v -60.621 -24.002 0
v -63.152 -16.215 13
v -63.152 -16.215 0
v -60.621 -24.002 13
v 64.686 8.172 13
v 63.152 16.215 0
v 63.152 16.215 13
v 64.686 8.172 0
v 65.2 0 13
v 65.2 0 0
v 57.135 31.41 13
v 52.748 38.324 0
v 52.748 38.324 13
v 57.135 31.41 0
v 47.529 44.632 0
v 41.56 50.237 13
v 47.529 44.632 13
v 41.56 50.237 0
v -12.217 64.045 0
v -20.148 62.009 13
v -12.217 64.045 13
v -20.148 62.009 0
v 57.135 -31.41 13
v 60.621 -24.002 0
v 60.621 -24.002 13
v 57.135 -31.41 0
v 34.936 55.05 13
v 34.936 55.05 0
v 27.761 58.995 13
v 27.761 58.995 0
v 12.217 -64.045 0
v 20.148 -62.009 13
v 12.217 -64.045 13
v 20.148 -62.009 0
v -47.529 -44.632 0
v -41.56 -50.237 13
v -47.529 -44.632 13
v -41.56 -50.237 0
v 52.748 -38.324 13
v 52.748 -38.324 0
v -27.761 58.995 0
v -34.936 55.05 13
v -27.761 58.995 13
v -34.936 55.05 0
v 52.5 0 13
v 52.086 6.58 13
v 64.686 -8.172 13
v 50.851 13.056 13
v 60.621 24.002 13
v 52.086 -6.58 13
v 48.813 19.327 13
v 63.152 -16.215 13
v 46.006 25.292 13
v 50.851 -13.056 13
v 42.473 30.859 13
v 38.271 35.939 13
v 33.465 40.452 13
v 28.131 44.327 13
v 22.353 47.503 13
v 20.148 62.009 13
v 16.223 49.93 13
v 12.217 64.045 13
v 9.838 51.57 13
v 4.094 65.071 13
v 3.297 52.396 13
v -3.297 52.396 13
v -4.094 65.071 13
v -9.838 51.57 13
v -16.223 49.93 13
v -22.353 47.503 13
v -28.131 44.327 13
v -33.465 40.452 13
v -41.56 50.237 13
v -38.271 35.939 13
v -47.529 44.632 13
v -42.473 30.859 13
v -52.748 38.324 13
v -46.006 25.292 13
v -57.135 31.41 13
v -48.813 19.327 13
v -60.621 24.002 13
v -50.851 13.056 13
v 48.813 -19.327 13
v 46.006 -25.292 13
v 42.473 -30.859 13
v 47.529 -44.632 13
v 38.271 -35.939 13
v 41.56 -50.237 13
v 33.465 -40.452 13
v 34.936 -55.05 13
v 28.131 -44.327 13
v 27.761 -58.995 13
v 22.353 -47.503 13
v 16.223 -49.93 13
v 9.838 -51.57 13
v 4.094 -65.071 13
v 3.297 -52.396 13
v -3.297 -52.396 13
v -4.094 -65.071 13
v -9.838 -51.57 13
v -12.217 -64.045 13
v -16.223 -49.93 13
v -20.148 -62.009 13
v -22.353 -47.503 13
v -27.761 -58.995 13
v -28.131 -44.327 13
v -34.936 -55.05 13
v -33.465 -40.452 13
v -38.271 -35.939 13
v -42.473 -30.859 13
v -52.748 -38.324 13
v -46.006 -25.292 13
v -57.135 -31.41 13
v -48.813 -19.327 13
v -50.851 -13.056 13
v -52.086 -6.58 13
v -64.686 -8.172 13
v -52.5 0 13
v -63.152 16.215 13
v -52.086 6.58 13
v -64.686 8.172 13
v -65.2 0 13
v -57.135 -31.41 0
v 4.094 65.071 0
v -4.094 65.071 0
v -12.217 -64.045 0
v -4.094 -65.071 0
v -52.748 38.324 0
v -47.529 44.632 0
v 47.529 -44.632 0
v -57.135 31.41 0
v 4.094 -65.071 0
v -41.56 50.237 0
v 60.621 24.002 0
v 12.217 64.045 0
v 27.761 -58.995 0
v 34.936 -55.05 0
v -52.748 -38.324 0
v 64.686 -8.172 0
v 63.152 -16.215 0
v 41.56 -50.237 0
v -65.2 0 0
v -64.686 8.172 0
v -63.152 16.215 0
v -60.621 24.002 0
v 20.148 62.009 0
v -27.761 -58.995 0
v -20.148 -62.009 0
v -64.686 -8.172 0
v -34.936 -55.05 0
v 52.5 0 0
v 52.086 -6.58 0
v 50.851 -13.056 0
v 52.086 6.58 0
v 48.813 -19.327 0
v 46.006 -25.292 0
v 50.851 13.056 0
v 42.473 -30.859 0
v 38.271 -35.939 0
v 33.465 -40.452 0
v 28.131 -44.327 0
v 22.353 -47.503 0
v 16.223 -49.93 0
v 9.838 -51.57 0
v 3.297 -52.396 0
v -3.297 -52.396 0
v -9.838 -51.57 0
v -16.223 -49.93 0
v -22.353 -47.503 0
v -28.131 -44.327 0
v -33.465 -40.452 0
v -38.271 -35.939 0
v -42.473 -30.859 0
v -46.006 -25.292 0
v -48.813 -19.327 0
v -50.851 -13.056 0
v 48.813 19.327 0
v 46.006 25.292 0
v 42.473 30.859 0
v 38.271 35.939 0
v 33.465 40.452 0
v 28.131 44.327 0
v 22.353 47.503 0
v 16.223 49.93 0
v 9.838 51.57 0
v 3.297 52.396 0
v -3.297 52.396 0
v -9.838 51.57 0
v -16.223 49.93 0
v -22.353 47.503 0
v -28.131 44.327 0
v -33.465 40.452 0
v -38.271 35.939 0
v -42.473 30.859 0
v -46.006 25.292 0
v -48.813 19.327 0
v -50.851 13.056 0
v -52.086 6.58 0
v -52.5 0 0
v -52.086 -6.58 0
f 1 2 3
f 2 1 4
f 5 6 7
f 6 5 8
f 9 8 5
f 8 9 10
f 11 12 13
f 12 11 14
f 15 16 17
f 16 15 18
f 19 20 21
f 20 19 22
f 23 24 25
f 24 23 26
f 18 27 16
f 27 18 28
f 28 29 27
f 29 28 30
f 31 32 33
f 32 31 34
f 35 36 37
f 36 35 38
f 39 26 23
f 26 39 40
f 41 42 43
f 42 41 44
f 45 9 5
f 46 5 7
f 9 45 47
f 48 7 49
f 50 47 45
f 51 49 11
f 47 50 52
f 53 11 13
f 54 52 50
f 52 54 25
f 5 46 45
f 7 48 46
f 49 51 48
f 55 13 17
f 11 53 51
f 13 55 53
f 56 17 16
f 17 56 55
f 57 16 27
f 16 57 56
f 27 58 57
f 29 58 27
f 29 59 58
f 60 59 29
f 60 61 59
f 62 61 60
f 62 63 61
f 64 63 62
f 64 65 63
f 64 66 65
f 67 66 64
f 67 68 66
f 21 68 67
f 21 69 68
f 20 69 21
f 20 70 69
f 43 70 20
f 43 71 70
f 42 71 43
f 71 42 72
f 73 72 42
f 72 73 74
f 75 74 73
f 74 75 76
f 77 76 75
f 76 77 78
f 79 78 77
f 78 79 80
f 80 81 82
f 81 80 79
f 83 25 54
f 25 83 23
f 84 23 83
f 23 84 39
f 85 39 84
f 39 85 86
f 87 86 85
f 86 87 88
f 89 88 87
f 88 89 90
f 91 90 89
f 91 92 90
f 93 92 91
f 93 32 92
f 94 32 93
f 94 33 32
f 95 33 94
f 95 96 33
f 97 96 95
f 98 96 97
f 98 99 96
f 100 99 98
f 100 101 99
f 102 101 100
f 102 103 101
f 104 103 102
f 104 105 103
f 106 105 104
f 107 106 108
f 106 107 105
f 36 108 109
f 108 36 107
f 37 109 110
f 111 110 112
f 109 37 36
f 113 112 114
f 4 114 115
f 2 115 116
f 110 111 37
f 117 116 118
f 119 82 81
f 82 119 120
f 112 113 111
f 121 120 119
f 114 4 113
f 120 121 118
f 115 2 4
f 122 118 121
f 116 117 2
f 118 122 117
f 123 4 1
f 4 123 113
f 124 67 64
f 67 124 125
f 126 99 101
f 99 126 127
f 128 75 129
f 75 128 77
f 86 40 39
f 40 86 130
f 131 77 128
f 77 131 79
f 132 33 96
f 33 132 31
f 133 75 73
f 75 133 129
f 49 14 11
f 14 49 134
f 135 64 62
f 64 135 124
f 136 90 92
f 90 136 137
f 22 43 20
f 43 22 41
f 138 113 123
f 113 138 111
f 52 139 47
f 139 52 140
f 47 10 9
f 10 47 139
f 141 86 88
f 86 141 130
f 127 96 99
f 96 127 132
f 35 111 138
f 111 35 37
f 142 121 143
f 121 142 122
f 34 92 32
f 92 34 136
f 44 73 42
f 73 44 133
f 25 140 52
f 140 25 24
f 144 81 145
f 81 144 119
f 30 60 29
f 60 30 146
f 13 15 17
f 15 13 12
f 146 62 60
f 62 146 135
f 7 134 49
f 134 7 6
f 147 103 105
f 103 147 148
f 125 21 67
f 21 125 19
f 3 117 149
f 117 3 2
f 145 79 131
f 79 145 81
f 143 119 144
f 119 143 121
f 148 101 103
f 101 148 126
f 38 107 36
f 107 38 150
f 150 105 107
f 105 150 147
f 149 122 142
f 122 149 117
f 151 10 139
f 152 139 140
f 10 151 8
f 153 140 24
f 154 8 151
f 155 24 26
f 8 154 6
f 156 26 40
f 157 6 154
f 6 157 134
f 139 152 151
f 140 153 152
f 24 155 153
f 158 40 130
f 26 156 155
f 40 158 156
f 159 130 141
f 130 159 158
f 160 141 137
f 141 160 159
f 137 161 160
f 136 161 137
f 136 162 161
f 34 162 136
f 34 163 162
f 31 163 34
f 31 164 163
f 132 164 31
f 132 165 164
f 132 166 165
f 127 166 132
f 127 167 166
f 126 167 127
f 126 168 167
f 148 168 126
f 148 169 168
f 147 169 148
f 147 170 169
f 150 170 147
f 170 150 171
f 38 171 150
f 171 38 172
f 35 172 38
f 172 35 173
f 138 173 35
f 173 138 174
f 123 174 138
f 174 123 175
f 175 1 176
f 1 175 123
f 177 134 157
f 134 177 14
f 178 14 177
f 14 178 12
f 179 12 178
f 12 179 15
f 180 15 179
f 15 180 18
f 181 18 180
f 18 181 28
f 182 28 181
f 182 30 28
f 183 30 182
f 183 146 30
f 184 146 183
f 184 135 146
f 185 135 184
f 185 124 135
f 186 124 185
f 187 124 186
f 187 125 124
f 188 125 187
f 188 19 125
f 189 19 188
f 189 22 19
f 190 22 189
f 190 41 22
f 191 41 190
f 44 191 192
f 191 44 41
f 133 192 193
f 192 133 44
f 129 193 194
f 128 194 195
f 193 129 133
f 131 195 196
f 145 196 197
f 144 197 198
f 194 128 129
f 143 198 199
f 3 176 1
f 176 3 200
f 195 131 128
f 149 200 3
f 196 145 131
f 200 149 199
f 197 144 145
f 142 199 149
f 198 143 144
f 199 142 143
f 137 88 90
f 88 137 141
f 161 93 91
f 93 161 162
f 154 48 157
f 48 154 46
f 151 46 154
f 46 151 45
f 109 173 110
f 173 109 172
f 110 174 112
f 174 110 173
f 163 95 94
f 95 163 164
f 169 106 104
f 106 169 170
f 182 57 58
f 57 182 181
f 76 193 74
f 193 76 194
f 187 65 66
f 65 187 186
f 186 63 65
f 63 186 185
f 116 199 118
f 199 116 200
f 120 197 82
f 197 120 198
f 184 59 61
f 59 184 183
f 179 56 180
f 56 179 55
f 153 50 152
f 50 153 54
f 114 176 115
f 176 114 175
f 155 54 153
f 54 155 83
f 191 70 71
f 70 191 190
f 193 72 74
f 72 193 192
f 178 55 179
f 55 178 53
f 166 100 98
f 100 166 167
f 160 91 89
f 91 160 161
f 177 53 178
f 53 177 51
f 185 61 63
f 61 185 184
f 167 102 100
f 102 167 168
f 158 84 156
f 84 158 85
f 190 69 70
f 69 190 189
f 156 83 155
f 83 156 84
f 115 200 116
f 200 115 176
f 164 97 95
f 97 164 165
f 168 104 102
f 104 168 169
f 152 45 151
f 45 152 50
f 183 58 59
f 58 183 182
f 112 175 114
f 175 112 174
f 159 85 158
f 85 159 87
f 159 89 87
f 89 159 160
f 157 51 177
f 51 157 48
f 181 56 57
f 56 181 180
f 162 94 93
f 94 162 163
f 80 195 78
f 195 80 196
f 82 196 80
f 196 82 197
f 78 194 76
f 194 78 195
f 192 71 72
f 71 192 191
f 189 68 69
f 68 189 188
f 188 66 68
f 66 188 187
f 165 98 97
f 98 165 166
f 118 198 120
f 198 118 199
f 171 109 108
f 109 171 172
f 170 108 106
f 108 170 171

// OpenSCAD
$fn = 50;


difference() {
	union() {
		cylinder(h = 13, r = 65.2000000000);
	}
	union() {
		cylinder(h = 13, r = 52.5000000000);
	}
}
